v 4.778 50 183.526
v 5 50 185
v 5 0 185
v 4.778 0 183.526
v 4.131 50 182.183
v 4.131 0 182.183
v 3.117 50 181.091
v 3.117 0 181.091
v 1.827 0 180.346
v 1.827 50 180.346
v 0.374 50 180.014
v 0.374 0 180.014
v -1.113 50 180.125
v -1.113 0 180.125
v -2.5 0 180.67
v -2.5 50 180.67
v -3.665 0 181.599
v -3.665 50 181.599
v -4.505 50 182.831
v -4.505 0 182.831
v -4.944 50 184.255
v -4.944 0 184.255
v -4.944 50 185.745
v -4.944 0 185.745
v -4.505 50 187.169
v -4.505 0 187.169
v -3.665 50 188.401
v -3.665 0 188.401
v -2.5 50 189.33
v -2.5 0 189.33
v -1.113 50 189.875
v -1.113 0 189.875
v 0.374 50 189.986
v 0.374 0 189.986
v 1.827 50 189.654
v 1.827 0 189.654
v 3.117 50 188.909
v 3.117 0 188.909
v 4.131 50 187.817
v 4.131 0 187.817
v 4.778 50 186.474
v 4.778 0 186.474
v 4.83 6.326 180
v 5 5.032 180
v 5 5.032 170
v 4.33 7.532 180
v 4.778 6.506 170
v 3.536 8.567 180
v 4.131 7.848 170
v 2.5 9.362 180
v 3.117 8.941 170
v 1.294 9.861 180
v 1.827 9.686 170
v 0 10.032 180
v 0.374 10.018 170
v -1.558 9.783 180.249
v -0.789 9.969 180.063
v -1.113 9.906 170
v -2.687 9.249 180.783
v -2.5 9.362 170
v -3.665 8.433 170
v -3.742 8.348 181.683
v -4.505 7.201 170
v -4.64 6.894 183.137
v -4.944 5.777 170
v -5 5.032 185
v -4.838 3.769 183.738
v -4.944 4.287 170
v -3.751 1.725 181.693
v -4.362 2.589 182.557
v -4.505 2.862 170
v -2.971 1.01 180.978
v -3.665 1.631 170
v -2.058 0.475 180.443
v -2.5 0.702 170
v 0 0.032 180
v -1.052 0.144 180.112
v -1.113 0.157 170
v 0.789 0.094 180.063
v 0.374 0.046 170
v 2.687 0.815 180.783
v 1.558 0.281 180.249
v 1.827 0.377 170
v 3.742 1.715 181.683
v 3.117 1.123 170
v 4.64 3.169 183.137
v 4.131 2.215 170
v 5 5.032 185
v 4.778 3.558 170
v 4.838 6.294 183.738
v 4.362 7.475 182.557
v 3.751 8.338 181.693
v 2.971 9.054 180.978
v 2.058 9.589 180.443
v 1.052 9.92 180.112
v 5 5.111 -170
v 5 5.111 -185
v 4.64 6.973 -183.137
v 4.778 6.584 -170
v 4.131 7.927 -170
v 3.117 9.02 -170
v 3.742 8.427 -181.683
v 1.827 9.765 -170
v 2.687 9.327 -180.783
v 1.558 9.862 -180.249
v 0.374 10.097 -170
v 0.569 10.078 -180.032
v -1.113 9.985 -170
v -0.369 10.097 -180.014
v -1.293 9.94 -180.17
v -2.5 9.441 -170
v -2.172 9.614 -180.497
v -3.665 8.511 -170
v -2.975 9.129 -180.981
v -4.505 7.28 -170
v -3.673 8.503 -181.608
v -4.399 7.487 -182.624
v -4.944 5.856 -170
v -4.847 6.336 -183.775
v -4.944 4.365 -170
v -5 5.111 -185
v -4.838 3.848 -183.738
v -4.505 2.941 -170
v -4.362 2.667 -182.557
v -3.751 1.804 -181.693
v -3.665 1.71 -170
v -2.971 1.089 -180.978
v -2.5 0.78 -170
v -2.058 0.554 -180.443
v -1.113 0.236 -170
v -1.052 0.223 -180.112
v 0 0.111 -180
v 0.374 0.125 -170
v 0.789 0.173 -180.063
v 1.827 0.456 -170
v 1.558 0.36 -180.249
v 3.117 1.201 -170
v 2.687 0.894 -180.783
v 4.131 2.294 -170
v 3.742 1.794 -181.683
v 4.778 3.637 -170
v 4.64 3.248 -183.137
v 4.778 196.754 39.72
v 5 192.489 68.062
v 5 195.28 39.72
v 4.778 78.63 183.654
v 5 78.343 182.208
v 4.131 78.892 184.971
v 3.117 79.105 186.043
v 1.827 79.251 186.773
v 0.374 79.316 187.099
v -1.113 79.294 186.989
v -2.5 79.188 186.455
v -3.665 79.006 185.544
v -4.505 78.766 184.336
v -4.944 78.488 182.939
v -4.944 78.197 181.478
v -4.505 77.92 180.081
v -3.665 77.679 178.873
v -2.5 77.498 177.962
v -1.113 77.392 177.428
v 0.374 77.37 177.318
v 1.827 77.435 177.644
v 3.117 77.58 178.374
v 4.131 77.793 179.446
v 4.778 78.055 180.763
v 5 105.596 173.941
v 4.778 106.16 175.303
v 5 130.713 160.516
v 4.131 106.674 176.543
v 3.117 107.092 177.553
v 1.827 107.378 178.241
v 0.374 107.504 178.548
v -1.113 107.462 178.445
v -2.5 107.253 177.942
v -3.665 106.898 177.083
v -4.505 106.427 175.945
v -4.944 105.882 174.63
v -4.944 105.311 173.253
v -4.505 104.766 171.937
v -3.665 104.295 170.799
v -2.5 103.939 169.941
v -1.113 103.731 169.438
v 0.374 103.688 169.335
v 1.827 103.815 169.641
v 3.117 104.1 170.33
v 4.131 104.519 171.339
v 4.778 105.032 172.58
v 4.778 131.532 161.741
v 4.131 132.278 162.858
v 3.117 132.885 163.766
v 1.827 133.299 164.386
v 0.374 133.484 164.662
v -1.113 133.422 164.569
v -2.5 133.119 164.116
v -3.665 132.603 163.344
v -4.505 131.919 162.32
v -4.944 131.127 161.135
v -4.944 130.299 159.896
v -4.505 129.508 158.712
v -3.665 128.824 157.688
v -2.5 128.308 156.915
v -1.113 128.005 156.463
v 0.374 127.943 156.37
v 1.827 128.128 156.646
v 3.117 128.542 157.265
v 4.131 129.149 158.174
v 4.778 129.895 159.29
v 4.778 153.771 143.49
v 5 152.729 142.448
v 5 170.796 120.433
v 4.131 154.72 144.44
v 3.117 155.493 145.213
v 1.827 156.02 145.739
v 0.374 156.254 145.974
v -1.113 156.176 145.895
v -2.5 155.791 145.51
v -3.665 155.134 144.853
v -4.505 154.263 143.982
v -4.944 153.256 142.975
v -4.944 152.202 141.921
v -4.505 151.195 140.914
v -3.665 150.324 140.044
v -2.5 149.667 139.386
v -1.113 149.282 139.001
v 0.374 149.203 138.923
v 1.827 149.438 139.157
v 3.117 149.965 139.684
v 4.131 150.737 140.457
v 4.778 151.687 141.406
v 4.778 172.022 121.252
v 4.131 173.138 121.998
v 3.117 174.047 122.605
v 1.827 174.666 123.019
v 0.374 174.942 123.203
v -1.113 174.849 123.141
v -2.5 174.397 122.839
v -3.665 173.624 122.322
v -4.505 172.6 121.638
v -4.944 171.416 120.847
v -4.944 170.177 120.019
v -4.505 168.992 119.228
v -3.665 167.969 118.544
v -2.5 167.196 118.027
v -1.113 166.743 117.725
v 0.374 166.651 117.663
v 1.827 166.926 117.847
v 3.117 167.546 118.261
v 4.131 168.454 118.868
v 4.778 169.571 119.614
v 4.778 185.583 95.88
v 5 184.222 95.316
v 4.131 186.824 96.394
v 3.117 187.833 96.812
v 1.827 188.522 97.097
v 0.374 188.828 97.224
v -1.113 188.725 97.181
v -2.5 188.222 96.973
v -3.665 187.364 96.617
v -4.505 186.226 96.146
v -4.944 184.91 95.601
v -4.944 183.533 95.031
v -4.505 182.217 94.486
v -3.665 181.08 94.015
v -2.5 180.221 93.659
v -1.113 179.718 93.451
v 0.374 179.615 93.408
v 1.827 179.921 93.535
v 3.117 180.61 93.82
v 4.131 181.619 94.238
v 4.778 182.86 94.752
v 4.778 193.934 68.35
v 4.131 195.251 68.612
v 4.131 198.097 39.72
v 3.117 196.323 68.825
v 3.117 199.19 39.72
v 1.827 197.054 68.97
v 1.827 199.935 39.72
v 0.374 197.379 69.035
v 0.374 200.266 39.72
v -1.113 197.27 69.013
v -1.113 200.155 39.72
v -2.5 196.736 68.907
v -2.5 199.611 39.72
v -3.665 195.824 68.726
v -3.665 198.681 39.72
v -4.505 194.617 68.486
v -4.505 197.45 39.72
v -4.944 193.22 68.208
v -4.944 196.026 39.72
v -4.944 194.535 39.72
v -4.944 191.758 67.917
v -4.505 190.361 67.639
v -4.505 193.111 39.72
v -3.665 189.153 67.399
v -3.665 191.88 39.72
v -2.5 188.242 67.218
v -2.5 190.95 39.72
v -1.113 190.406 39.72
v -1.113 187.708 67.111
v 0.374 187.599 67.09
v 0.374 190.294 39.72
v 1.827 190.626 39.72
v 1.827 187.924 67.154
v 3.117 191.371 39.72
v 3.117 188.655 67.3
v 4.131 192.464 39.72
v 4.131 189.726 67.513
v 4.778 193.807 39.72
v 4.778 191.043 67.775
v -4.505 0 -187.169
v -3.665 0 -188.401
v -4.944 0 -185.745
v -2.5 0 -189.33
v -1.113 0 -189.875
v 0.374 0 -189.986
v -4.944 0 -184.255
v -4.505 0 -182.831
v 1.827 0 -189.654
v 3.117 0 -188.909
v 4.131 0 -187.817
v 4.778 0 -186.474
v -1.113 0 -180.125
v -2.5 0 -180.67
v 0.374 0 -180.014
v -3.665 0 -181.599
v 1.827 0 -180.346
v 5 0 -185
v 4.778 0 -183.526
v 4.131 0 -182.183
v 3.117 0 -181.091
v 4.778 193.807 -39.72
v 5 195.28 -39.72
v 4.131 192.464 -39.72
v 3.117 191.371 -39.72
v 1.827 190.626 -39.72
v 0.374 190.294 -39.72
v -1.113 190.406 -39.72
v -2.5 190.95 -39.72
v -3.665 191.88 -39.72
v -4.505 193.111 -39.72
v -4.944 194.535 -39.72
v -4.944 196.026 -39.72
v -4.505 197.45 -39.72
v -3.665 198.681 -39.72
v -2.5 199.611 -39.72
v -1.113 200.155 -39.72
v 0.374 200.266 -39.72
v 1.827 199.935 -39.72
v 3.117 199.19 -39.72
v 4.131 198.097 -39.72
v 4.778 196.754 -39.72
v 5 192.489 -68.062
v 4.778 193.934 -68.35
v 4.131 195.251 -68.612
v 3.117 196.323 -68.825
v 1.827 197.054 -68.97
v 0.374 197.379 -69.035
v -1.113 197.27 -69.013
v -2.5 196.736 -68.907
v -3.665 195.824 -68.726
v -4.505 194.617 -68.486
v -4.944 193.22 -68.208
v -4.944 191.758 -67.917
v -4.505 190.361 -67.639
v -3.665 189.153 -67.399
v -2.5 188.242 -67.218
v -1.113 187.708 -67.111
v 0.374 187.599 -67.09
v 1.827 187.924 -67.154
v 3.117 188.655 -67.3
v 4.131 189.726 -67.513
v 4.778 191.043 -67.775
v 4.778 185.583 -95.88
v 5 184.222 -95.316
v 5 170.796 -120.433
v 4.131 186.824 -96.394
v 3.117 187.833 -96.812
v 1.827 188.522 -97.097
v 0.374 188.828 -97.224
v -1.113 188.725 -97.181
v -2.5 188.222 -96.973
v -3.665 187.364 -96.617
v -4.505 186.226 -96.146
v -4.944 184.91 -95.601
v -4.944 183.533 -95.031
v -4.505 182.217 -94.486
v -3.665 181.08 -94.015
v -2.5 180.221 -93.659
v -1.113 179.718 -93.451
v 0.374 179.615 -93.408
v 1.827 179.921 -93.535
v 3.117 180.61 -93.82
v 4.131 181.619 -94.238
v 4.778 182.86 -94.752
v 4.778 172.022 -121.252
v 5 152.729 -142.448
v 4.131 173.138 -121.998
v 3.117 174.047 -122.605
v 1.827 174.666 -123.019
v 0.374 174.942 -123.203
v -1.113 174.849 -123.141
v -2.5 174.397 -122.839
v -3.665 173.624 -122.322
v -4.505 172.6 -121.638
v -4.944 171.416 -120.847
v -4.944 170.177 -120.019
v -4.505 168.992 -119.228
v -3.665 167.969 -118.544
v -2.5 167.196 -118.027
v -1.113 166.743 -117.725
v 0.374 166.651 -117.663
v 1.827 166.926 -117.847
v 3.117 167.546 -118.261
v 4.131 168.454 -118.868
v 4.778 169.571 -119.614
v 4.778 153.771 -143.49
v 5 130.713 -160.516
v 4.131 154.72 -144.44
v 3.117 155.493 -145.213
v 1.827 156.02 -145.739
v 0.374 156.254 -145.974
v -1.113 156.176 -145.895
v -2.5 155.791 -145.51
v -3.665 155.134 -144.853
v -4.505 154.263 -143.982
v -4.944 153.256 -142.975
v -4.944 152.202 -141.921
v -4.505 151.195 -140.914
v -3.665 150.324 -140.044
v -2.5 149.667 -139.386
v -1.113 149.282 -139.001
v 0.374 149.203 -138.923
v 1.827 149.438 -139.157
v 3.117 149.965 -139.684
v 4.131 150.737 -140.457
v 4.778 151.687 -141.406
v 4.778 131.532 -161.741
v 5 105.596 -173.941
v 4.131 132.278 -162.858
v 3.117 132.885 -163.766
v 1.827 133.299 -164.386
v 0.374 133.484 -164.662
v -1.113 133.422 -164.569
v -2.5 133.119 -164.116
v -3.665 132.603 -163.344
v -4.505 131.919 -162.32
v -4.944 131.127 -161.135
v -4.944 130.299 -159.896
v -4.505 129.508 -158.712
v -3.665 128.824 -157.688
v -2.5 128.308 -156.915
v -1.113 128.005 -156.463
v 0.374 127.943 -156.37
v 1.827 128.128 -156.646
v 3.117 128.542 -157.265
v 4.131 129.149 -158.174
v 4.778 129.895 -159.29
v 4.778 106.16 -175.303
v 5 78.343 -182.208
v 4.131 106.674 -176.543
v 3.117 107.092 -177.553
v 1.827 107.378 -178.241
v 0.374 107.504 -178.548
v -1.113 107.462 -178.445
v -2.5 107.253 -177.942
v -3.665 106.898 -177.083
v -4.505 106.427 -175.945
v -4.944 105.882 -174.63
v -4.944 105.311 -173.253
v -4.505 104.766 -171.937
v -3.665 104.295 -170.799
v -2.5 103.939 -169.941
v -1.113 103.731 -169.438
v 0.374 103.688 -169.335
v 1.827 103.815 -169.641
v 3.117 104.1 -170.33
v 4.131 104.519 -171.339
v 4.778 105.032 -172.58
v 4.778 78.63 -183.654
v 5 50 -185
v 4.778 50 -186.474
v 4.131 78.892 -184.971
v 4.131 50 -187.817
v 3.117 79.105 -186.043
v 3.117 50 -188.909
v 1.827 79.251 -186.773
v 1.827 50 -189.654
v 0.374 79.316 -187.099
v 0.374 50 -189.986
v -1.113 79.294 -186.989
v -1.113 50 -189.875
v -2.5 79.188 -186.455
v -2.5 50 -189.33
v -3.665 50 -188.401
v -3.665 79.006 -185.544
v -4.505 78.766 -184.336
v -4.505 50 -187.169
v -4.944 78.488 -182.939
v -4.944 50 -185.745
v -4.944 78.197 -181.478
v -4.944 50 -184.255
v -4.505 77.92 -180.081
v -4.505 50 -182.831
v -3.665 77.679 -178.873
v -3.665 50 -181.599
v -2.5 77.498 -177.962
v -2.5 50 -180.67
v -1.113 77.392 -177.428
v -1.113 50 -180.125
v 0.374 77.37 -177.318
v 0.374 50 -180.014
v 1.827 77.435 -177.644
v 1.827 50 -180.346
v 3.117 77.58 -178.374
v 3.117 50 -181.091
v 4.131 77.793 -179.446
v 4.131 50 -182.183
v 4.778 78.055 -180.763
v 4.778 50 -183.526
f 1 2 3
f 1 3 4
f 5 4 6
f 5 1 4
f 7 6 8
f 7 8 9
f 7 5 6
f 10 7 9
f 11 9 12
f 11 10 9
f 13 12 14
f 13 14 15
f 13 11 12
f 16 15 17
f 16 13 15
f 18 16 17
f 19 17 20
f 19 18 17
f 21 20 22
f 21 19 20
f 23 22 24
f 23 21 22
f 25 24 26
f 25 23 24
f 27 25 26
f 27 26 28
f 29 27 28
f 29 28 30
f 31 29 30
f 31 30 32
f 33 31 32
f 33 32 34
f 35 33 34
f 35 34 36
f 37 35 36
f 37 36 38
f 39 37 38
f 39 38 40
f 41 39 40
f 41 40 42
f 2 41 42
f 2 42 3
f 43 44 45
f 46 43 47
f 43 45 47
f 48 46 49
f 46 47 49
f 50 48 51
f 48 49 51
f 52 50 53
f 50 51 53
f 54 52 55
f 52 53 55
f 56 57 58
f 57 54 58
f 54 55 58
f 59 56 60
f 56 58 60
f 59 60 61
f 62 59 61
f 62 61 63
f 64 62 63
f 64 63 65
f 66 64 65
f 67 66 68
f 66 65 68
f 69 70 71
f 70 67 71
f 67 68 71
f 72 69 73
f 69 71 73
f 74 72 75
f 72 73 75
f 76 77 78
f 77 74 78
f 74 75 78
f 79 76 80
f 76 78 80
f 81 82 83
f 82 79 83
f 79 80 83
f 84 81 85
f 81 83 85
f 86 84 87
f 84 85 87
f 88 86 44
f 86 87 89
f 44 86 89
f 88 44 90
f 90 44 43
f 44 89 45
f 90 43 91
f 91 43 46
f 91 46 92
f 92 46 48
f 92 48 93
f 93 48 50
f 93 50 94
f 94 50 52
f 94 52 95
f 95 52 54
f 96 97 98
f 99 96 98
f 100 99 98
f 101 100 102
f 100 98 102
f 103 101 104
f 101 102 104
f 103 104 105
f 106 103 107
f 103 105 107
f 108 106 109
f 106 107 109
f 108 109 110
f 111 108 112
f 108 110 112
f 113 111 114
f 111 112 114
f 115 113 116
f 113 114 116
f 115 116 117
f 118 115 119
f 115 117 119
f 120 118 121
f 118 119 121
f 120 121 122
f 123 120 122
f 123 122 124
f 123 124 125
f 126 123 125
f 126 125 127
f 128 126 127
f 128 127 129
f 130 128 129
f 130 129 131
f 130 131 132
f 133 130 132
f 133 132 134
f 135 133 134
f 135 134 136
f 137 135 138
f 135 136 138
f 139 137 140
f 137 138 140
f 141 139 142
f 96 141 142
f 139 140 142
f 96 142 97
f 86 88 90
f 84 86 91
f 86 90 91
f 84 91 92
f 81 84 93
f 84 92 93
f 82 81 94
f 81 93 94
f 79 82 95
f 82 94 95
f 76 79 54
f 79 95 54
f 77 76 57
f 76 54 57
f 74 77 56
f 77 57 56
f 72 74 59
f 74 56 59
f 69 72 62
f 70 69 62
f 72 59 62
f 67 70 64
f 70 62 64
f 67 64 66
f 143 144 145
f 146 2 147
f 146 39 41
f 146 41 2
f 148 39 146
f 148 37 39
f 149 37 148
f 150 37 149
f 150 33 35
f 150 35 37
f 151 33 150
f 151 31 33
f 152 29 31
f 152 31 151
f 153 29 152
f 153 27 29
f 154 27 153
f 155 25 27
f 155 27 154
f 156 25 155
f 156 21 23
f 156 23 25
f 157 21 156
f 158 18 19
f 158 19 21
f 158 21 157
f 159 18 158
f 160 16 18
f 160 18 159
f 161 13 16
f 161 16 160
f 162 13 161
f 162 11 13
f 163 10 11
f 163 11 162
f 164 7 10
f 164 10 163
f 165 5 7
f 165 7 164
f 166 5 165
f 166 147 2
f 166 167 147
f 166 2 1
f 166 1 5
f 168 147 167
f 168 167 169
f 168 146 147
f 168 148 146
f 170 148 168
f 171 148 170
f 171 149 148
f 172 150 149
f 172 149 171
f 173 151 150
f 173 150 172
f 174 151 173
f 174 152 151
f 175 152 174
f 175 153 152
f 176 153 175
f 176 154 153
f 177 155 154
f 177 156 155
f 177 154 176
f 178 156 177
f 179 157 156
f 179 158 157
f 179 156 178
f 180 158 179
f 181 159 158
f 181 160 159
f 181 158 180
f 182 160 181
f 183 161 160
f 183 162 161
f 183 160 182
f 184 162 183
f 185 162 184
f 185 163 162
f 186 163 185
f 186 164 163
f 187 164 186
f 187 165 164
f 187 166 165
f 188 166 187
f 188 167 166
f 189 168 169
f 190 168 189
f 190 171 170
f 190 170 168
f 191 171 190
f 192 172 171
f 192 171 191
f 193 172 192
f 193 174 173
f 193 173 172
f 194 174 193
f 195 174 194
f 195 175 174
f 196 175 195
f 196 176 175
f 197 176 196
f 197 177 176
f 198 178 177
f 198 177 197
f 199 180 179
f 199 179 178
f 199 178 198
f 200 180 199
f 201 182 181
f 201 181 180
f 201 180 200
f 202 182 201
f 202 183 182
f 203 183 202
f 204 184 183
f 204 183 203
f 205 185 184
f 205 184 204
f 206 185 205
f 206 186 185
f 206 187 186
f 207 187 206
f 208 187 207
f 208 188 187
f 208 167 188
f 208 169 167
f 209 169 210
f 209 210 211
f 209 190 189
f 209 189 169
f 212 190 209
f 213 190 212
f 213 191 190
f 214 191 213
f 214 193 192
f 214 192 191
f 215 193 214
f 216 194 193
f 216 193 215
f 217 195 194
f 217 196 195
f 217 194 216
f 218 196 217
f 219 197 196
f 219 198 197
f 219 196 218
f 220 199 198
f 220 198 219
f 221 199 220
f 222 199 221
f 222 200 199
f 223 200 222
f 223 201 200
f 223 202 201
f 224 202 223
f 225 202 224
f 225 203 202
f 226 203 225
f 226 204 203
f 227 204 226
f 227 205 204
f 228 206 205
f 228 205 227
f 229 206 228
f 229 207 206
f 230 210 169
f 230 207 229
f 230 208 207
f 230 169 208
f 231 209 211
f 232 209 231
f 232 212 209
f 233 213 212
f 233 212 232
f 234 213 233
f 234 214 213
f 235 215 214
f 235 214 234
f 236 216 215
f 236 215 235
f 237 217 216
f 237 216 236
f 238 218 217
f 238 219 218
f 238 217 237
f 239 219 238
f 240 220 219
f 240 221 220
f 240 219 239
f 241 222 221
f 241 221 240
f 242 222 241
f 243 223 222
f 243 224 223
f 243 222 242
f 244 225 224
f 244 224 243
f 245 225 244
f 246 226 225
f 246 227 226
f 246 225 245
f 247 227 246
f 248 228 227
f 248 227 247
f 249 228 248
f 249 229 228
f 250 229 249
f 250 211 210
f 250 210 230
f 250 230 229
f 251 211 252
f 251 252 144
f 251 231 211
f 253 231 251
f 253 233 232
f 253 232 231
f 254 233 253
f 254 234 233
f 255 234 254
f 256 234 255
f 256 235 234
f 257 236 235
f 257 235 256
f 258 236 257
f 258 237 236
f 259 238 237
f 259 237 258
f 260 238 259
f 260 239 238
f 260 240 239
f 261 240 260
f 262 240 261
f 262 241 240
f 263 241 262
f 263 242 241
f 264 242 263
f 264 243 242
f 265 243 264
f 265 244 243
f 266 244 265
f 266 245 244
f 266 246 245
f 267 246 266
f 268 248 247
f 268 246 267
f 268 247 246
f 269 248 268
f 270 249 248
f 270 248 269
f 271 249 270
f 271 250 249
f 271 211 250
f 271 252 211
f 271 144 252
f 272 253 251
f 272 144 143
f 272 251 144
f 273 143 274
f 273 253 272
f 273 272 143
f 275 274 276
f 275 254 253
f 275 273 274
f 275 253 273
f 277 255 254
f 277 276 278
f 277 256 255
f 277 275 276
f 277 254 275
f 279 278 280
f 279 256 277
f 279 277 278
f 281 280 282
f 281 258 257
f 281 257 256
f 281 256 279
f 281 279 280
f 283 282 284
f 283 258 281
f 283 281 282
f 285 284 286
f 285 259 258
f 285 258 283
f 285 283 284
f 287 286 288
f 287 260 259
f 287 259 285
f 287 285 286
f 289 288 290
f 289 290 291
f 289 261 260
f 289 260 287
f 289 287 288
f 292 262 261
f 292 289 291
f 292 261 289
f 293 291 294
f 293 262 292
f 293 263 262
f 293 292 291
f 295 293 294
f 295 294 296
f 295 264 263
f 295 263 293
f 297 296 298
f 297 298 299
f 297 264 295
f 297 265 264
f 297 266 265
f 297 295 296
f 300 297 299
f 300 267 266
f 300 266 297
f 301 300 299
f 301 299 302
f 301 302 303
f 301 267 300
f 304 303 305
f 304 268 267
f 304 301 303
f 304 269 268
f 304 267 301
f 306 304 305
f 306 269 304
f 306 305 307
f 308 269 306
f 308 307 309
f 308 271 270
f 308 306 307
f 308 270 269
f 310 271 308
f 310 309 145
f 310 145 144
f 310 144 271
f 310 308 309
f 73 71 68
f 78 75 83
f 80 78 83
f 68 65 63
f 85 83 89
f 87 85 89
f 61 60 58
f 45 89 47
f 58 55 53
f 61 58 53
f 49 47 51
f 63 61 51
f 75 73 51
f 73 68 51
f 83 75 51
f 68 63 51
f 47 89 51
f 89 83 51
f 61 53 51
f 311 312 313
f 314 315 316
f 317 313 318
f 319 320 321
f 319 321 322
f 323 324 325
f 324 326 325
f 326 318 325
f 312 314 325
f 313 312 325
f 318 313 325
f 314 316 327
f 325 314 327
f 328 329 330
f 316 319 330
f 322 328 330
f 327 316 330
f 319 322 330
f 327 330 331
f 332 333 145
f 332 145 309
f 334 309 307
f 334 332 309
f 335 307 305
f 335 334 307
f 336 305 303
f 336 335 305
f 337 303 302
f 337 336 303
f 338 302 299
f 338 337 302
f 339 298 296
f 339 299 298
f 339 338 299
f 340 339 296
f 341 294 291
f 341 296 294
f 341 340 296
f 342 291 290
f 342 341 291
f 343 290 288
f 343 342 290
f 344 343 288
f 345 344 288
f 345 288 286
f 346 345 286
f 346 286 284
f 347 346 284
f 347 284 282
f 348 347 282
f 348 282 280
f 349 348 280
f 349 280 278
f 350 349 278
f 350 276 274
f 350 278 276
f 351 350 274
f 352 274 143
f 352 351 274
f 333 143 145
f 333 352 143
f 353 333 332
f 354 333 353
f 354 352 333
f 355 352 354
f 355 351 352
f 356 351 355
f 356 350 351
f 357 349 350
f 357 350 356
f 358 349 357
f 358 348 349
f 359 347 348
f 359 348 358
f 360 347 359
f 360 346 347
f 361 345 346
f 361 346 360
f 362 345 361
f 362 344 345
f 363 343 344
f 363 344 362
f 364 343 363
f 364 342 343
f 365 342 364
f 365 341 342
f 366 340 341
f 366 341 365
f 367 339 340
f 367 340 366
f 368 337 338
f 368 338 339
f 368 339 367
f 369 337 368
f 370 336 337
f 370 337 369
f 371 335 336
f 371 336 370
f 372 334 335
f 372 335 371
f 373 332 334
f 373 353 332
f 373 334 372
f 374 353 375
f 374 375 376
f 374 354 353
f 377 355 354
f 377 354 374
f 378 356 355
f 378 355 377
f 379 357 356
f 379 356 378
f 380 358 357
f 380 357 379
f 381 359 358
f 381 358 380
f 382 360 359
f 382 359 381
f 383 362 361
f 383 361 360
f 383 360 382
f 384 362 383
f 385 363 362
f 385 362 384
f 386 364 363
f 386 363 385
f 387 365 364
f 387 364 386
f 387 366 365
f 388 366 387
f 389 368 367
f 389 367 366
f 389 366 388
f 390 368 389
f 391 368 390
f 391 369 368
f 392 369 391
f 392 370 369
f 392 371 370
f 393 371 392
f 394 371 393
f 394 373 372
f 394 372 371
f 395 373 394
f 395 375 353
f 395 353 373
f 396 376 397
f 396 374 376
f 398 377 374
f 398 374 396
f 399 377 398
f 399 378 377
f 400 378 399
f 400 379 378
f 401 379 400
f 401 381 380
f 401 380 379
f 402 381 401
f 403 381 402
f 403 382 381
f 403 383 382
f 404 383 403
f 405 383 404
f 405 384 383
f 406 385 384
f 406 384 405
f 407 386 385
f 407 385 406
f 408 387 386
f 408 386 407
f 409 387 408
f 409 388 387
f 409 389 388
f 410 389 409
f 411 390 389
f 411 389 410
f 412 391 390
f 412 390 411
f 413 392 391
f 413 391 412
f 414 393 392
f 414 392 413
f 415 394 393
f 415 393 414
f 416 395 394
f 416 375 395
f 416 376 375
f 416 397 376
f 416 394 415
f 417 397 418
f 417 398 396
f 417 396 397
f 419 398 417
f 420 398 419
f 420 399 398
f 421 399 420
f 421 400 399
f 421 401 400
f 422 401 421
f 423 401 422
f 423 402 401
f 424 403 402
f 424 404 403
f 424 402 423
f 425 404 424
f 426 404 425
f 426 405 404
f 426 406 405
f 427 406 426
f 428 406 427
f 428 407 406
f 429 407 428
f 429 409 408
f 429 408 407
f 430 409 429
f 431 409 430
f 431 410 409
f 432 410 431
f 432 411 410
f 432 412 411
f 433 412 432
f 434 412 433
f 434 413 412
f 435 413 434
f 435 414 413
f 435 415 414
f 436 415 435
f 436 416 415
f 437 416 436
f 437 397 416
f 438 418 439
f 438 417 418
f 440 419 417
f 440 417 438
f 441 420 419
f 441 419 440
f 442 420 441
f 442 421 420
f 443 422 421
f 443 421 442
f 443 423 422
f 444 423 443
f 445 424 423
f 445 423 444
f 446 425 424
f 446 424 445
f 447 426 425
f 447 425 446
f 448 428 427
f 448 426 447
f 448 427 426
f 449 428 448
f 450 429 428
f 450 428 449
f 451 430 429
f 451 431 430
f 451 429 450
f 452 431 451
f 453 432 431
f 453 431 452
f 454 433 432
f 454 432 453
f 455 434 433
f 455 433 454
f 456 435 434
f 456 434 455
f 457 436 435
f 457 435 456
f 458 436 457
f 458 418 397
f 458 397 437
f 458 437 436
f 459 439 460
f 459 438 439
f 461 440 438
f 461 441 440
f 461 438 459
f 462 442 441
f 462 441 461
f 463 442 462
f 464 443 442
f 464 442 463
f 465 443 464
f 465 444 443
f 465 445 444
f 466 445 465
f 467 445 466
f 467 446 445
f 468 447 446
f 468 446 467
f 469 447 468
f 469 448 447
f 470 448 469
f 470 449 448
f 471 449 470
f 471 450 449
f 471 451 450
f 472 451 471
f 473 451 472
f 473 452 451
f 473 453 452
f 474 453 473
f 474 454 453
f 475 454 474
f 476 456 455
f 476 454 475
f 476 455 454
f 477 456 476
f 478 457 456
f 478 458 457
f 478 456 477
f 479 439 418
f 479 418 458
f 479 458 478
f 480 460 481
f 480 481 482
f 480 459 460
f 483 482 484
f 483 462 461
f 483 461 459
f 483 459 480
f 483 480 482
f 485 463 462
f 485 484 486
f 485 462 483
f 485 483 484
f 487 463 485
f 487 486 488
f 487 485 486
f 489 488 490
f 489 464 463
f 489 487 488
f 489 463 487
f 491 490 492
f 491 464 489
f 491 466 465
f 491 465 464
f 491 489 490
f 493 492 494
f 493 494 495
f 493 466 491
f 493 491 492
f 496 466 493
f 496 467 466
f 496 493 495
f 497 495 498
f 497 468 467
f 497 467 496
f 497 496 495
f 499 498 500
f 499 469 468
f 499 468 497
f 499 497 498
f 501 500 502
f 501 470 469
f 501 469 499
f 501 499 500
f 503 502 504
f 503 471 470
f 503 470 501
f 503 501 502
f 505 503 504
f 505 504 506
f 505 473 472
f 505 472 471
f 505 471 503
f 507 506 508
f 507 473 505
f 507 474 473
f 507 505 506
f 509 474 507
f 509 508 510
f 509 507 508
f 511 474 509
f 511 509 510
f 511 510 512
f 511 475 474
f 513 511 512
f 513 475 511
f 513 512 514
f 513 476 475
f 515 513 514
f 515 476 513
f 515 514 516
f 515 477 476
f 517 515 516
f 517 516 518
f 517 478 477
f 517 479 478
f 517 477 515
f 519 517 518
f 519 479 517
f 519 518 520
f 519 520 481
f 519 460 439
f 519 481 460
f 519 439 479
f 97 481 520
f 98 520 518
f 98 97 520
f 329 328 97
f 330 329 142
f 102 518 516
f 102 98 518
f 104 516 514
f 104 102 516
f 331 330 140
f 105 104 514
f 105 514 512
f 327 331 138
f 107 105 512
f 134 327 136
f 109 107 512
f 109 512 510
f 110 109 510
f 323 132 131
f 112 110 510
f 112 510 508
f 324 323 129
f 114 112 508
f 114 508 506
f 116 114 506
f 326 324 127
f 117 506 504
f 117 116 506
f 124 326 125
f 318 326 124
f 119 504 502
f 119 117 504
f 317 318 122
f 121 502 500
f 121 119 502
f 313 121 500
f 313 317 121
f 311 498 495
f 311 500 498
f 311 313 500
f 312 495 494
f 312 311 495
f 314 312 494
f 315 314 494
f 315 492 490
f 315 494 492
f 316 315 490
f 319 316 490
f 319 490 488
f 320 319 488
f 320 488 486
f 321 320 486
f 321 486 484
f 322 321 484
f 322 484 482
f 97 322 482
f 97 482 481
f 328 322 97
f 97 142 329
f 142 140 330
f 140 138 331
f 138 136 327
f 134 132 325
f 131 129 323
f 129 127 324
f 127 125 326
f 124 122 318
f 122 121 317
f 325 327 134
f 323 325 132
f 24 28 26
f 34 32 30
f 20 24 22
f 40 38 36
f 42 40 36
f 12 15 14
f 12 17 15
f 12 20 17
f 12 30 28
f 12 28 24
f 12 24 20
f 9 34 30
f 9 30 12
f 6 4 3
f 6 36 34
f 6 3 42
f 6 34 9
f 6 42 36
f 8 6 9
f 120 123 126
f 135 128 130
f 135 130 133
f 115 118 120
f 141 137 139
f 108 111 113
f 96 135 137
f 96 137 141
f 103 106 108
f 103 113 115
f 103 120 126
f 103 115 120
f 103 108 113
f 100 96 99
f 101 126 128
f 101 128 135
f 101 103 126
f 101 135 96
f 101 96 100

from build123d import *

# Parameters (mm, degrees)
SKETCH2_R                       = 5
SKETCH3_R                       = 5
BOSS_EXTRUDE1_DEPTH             = 10
BOSS_EXTRUDE1_DIRECTION_2_REACH = 12
BOSS_EXTRUDE2_START             = -5
SKETCH4_R                       = 5
BOSS_EXTRUDE2_DEPTH             = 15


with BuildPart() as part:
    # Sweep2: sweep along a path in Sketch1
    with BuildLine(Plane(origin=(0, 0, 0), x_dir=(0, 0, -1), z_dir=(1, 0, 0))) as sweep2_path:
        Line((-185, 0), (-185, 50))
        ThreePointArc((-185, 50), (-142.448359859, 152.728746731), (-39.719613128, 195.280386872))
        Line((-39.719613128, 195.280386872), (39.719613128, 195.280386872))
        ThreePointArc((39.719613128, 195.280386872), (142.448359859, 152.728746731), (185, 50))
        Line((185, 50), (185, 0))
    # Sketch2 → Sweep2 (sweep)
    with BuildSketch(Plane(origin=(0, 0, 0), x_dir=(1, 0, 0), z_dir=(0, 1, 0))):
        with Locations((0, 185)):
            Circle(SKETCH2_R)
    sweep(path=sweep2_path.line)


with BuildPart() as body_2:
    # Sketch3 → Boss-Extrude1 (new body)
    with BuildSketch(Plane.XY.offset(180)):
        with Locations((0, 5.031728254)):
            Circle(SKETCH3_R)
    extrude(amount=-BOSS_EXTRUDE1_DEPTH)


    # Sketch3 → Boss-Extrude1 direction 2 (add, up to next)
    with BuildSketch(Plane.XY.offset(180), mode=Mode.PRIVATE) as boss_extrude1_direction_2_sk1:
        with Locations((0, 5.031728254)):
            Circle(SKETCH3_R)
    boss_extrude1_direction_2_tool1 = extrude(boss_extrude1_direction_2_sk1.sketch, amount=BOSS_EXTRUDE1_DIRECTION_2_REACH, mode=Mode.PRIVATE) - part.part
    add(boss_extrude1_direction_2_tool1.solids().sort_by_distance((0, 5.031728, 180))[0])
    add(boss_extrude1_direction_2_tool1.solids().sort_by_distance((0, 5.031728, 180))[1])


with BuildPart() as part_1:
    add(part.part)

    # Sketch4 → Boss-Extrude2 (add)
    with BuildSketch(Plane.XY.offset(-180).offset(BOSS_EXTRUDE2_START)):
        with Locations((0, 5.110605583)):
            Circle(SKETCH4_R)
    extrude(amount=BOSS_EXTRUDE2_DEPTH)


solid = Compound([body_2.part, part_1.part])
